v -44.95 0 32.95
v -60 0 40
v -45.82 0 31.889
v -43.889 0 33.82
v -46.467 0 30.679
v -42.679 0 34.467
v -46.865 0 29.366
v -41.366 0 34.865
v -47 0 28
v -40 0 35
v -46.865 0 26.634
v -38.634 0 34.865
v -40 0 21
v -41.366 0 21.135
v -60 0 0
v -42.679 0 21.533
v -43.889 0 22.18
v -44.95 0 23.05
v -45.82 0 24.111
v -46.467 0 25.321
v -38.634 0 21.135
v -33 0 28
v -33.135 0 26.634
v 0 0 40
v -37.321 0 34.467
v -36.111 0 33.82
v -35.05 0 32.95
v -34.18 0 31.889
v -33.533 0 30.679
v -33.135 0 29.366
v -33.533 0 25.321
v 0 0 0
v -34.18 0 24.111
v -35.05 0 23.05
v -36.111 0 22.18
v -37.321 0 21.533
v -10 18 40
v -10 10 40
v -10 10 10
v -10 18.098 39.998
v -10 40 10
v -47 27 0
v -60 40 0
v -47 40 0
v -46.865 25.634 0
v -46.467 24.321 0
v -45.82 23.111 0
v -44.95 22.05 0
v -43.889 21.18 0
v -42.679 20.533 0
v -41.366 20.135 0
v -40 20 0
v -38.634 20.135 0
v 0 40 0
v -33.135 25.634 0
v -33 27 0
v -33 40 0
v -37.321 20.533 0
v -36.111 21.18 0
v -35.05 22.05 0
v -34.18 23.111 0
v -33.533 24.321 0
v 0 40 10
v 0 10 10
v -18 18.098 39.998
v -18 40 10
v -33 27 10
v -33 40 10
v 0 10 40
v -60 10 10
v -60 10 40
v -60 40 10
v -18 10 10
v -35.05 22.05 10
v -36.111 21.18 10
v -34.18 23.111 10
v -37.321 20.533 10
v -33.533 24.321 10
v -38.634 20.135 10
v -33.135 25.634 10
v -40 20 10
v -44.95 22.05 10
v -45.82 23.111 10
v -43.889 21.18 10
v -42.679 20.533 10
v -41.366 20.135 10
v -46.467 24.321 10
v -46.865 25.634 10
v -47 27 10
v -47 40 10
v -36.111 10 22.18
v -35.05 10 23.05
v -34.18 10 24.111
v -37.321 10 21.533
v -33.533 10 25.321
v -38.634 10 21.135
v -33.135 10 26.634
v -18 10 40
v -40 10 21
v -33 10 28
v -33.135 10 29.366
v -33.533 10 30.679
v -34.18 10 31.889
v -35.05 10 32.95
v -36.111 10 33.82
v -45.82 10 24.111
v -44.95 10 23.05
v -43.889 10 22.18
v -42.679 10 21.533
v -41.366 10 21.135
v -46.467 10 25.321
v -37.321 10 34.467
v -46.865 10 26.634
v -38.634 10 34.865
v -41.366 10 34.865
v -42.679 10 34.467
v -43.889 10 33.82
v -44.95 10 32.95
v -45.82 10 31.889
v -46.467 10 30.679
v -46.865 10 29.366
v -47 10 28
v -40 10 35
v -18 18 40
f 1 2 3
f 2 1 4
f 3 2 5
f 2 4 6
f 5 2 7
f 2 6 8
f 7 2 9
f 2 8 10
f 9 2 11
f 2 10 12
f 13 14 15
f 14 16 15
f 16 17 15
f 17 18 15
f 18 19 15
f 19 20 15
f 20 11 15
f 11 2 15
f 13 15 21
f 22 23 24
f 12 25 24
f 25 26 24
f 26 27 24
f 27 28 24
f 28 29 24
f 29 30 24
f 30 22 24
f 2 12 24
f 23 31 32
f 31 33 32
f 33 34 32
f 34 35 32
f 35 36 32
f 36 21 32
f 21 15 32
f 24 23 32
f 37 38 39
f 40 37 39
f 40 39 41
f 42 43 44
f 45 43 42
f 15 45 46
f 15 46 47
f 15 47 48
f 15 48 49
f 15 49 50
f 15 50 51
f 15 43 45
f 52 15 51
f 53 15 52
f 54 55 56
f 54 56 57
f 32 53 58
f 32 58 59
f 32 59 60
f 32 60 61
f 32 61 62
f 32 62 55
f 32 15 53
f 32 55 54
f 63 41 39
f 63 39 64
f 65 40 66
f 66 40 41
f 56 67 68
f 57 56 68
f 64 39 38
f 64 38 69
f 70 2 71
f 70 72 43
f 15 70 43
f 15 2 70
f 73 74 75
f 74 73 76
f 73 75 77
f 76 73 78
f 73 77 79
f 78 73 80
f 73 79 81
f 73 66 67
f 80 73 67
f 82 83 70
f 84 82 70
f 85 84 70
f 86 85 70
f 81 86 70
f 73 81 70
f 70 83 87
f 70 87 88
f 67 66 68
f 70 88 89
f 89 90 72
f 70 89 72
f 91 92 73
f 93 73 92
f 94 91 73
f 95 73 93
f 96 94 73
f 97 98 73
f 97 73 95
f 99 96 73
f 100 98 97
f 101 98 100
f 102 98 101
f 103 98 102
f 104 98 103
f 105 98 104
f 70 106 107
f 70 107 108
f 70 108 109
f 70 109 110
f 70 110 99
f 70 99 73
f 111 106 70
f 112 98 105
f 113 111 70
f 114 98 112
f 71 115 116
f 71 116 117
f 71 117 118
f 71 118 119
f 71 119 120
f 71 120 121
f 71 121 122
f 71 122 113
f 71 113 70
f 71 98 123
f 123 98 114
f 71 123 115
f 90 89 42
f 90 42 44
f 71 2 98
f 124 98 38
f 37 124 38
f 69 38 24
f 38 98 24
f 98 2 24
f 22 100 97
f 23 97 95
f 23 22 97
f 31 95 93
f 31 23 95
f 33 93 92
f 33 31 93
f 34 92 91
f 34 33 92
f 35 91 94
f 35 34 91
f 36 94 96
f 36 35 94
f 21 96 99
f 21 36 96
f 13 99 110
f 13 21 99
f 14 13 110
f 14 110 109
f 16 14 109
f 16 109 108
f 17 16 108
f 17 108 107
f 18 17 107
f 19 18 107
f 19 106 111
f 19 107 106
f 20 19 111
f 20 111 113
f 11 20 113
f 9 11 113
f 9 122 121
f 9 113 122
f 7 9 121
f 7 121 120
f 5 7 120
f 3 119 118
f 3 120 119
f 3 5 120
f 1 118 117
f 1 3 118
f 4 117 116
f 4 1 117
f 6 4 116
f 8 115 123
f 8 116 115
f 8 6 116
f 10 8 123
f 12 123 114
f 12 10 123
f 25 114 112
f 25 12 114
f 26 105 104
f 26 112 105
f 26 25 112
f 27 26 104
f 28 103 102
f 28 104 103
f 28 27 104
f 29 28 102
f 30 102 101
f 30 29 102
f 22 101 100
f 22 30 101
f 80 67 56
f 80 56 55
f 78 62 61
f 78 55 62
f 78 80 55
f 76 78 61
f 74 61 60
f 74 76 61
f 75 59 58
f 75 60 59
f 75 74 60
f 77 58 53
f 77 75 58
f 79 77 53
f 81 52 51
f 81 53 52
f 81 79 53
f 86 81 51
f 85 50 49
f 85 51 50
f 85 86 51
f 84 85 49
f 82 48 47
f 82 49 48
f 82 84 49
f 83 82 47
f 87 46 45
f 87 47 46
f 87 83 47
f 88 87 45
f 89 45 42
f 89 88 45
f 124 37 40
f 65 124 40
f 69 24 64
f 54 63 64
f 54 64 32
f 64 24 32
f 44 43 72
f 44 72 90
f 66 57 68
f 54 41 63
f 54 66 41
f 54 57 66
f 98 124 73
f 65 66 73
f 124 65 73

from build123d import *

# Parameters (mm, degrees)
SKETCH_3_W               = 60
SKETCH_3_H               = 40
EXTRUDE_2_DEPTH          = 40
CUT_EXTRUDE_1_DEPTH      = 39
CUT_EXTRUDE_1_DEPTH_BACK = 0.0001
SKETCH_5_W               = 10
SKETCH_5_H               = 30
CUT_EXTRUDE_2_DEPTH      = 43
SKETCH_6_W               = 14
SKETCH_6_H               = 13
CUT_EXTRUDE_3_DEPTH      = 34
SKETCH_7_W               = 14
SKETCH_7_H               = 13
CUT_EXTRUDE_4_DEPTH      = 34
CUT_EXTRUDE_5_DEPTH      = 34
CUT_EXTRUDE_7_DEPTH      = 34
SKETCH_11_R              = 7
CUT_EXTRUDE_8_DEPTH      = 37


with BuildPart() as part:
    # 草图3 → 凸台-拉伸2 (new body)
    with BuildSketch(Plane(origin=(0, 0, 0), x_dir=(1, 0, 0), z_dir=(0, 1, 0))):
        with Locations((-30, -20)):
            Rectangle(SKETCH_3_W, SKETCH_3_H)
    extrude(amount=EXTRUDE_2_DEPTH)

    # 草图4 → 切除-拉伸1 (cut, two sides)
    with BuildSketch(Plane.XY.offset(10)) as cut_extrude_1_sk:
        Polygon((-60, 40), (-47, 40), (-47, 27), (-33, 27), (-33, 40), (-18, 40), (-18, 10), (-60, 10), align=None)
    extrude(amount=CUT_EXTRUDE_1_DEPTH, mode=Mode.SUBTRACT)
    extrude(cut_extrude_1_sk.sketch, amount=-CUT_EXTRUDE_1_DEPTH_BACK, mode=Mode.SUBTRACT)

    # 草图5 → 切除-拉伸2 (cut)
    with BuildSketch(Plane.XY.offset(10)):
        with Locations((-5, 25)):
            Rectangle(SKETCH_5_W, SKETCH_5_H)
    extrude(amount=CUT_EXTRUDE_2_DEPTH, mode=Mode.SUBTRACT)

    # 草图6 → 切除-拉伸3 (cut)
    with BuildSketch(Plane.XY.offset(10)):
        with Locations((-40, 33.5)):
            Rectangle(SKETCH_6_W, SKETCH_6_H)
    extrude(amount=CUT_EXTRUDE_3_DEPTH, mode=Mode.SUBTRACT)

    # 草图7 → 切除-拉伸4 (cut)
    with BuildSketch(Plane.XY.offset(10)):
        with Locations((-40, 33.5)):
            Rectangle(SKETCH_7_W, SKETCH_7_H)
    extrude(amount=-CUT_EXTRUDE_4_DEPTH, mode=Mode.SUBTRACT)

    # 草图8 → 切除-拉伸5 (cut)
    with BuildSketch(Plane.XY.offset(10)):
        with BuildLine():
            Line((-47, 27), (-33, 27))
            ThreePointArc((-33, 27), (-40, 20), (-47, 27))
        make_face()
    extrude(amount=-CUT_EXTRUDE_5_DEPTH, mode=Mode.SUBTRACT)

    # 草图10 → 切除-拉伸7 (cut)
    with BuildSketch(Plane(origin=(0, 0, 0), x_dir=(0, 0, -1), z_dir=(1, 0, 0))):
        Polygon((-40, 40), (-40, 18), (-39.997988347, 18.098350801), (-10, 40), align=None)
    extrude(amount=-CUT_EXTRUDE_7_DEPTH, mode=Mode.SUBTRACT)

    # 草图11 → 切除-拉伸8 (cut)
    with BuildSketch(Plane(origin=(0, 0, 0), x_dir=(1, 0, 0), z_dir=(0, 1, 0))):
        with Locations((-40, -28)):
            Circle(SKETCH_11_R)
    extrude(amount=CUT_EXTRUDE_8_DEPTH, mode=Mode.SUBTRACT)


solid = part.part
